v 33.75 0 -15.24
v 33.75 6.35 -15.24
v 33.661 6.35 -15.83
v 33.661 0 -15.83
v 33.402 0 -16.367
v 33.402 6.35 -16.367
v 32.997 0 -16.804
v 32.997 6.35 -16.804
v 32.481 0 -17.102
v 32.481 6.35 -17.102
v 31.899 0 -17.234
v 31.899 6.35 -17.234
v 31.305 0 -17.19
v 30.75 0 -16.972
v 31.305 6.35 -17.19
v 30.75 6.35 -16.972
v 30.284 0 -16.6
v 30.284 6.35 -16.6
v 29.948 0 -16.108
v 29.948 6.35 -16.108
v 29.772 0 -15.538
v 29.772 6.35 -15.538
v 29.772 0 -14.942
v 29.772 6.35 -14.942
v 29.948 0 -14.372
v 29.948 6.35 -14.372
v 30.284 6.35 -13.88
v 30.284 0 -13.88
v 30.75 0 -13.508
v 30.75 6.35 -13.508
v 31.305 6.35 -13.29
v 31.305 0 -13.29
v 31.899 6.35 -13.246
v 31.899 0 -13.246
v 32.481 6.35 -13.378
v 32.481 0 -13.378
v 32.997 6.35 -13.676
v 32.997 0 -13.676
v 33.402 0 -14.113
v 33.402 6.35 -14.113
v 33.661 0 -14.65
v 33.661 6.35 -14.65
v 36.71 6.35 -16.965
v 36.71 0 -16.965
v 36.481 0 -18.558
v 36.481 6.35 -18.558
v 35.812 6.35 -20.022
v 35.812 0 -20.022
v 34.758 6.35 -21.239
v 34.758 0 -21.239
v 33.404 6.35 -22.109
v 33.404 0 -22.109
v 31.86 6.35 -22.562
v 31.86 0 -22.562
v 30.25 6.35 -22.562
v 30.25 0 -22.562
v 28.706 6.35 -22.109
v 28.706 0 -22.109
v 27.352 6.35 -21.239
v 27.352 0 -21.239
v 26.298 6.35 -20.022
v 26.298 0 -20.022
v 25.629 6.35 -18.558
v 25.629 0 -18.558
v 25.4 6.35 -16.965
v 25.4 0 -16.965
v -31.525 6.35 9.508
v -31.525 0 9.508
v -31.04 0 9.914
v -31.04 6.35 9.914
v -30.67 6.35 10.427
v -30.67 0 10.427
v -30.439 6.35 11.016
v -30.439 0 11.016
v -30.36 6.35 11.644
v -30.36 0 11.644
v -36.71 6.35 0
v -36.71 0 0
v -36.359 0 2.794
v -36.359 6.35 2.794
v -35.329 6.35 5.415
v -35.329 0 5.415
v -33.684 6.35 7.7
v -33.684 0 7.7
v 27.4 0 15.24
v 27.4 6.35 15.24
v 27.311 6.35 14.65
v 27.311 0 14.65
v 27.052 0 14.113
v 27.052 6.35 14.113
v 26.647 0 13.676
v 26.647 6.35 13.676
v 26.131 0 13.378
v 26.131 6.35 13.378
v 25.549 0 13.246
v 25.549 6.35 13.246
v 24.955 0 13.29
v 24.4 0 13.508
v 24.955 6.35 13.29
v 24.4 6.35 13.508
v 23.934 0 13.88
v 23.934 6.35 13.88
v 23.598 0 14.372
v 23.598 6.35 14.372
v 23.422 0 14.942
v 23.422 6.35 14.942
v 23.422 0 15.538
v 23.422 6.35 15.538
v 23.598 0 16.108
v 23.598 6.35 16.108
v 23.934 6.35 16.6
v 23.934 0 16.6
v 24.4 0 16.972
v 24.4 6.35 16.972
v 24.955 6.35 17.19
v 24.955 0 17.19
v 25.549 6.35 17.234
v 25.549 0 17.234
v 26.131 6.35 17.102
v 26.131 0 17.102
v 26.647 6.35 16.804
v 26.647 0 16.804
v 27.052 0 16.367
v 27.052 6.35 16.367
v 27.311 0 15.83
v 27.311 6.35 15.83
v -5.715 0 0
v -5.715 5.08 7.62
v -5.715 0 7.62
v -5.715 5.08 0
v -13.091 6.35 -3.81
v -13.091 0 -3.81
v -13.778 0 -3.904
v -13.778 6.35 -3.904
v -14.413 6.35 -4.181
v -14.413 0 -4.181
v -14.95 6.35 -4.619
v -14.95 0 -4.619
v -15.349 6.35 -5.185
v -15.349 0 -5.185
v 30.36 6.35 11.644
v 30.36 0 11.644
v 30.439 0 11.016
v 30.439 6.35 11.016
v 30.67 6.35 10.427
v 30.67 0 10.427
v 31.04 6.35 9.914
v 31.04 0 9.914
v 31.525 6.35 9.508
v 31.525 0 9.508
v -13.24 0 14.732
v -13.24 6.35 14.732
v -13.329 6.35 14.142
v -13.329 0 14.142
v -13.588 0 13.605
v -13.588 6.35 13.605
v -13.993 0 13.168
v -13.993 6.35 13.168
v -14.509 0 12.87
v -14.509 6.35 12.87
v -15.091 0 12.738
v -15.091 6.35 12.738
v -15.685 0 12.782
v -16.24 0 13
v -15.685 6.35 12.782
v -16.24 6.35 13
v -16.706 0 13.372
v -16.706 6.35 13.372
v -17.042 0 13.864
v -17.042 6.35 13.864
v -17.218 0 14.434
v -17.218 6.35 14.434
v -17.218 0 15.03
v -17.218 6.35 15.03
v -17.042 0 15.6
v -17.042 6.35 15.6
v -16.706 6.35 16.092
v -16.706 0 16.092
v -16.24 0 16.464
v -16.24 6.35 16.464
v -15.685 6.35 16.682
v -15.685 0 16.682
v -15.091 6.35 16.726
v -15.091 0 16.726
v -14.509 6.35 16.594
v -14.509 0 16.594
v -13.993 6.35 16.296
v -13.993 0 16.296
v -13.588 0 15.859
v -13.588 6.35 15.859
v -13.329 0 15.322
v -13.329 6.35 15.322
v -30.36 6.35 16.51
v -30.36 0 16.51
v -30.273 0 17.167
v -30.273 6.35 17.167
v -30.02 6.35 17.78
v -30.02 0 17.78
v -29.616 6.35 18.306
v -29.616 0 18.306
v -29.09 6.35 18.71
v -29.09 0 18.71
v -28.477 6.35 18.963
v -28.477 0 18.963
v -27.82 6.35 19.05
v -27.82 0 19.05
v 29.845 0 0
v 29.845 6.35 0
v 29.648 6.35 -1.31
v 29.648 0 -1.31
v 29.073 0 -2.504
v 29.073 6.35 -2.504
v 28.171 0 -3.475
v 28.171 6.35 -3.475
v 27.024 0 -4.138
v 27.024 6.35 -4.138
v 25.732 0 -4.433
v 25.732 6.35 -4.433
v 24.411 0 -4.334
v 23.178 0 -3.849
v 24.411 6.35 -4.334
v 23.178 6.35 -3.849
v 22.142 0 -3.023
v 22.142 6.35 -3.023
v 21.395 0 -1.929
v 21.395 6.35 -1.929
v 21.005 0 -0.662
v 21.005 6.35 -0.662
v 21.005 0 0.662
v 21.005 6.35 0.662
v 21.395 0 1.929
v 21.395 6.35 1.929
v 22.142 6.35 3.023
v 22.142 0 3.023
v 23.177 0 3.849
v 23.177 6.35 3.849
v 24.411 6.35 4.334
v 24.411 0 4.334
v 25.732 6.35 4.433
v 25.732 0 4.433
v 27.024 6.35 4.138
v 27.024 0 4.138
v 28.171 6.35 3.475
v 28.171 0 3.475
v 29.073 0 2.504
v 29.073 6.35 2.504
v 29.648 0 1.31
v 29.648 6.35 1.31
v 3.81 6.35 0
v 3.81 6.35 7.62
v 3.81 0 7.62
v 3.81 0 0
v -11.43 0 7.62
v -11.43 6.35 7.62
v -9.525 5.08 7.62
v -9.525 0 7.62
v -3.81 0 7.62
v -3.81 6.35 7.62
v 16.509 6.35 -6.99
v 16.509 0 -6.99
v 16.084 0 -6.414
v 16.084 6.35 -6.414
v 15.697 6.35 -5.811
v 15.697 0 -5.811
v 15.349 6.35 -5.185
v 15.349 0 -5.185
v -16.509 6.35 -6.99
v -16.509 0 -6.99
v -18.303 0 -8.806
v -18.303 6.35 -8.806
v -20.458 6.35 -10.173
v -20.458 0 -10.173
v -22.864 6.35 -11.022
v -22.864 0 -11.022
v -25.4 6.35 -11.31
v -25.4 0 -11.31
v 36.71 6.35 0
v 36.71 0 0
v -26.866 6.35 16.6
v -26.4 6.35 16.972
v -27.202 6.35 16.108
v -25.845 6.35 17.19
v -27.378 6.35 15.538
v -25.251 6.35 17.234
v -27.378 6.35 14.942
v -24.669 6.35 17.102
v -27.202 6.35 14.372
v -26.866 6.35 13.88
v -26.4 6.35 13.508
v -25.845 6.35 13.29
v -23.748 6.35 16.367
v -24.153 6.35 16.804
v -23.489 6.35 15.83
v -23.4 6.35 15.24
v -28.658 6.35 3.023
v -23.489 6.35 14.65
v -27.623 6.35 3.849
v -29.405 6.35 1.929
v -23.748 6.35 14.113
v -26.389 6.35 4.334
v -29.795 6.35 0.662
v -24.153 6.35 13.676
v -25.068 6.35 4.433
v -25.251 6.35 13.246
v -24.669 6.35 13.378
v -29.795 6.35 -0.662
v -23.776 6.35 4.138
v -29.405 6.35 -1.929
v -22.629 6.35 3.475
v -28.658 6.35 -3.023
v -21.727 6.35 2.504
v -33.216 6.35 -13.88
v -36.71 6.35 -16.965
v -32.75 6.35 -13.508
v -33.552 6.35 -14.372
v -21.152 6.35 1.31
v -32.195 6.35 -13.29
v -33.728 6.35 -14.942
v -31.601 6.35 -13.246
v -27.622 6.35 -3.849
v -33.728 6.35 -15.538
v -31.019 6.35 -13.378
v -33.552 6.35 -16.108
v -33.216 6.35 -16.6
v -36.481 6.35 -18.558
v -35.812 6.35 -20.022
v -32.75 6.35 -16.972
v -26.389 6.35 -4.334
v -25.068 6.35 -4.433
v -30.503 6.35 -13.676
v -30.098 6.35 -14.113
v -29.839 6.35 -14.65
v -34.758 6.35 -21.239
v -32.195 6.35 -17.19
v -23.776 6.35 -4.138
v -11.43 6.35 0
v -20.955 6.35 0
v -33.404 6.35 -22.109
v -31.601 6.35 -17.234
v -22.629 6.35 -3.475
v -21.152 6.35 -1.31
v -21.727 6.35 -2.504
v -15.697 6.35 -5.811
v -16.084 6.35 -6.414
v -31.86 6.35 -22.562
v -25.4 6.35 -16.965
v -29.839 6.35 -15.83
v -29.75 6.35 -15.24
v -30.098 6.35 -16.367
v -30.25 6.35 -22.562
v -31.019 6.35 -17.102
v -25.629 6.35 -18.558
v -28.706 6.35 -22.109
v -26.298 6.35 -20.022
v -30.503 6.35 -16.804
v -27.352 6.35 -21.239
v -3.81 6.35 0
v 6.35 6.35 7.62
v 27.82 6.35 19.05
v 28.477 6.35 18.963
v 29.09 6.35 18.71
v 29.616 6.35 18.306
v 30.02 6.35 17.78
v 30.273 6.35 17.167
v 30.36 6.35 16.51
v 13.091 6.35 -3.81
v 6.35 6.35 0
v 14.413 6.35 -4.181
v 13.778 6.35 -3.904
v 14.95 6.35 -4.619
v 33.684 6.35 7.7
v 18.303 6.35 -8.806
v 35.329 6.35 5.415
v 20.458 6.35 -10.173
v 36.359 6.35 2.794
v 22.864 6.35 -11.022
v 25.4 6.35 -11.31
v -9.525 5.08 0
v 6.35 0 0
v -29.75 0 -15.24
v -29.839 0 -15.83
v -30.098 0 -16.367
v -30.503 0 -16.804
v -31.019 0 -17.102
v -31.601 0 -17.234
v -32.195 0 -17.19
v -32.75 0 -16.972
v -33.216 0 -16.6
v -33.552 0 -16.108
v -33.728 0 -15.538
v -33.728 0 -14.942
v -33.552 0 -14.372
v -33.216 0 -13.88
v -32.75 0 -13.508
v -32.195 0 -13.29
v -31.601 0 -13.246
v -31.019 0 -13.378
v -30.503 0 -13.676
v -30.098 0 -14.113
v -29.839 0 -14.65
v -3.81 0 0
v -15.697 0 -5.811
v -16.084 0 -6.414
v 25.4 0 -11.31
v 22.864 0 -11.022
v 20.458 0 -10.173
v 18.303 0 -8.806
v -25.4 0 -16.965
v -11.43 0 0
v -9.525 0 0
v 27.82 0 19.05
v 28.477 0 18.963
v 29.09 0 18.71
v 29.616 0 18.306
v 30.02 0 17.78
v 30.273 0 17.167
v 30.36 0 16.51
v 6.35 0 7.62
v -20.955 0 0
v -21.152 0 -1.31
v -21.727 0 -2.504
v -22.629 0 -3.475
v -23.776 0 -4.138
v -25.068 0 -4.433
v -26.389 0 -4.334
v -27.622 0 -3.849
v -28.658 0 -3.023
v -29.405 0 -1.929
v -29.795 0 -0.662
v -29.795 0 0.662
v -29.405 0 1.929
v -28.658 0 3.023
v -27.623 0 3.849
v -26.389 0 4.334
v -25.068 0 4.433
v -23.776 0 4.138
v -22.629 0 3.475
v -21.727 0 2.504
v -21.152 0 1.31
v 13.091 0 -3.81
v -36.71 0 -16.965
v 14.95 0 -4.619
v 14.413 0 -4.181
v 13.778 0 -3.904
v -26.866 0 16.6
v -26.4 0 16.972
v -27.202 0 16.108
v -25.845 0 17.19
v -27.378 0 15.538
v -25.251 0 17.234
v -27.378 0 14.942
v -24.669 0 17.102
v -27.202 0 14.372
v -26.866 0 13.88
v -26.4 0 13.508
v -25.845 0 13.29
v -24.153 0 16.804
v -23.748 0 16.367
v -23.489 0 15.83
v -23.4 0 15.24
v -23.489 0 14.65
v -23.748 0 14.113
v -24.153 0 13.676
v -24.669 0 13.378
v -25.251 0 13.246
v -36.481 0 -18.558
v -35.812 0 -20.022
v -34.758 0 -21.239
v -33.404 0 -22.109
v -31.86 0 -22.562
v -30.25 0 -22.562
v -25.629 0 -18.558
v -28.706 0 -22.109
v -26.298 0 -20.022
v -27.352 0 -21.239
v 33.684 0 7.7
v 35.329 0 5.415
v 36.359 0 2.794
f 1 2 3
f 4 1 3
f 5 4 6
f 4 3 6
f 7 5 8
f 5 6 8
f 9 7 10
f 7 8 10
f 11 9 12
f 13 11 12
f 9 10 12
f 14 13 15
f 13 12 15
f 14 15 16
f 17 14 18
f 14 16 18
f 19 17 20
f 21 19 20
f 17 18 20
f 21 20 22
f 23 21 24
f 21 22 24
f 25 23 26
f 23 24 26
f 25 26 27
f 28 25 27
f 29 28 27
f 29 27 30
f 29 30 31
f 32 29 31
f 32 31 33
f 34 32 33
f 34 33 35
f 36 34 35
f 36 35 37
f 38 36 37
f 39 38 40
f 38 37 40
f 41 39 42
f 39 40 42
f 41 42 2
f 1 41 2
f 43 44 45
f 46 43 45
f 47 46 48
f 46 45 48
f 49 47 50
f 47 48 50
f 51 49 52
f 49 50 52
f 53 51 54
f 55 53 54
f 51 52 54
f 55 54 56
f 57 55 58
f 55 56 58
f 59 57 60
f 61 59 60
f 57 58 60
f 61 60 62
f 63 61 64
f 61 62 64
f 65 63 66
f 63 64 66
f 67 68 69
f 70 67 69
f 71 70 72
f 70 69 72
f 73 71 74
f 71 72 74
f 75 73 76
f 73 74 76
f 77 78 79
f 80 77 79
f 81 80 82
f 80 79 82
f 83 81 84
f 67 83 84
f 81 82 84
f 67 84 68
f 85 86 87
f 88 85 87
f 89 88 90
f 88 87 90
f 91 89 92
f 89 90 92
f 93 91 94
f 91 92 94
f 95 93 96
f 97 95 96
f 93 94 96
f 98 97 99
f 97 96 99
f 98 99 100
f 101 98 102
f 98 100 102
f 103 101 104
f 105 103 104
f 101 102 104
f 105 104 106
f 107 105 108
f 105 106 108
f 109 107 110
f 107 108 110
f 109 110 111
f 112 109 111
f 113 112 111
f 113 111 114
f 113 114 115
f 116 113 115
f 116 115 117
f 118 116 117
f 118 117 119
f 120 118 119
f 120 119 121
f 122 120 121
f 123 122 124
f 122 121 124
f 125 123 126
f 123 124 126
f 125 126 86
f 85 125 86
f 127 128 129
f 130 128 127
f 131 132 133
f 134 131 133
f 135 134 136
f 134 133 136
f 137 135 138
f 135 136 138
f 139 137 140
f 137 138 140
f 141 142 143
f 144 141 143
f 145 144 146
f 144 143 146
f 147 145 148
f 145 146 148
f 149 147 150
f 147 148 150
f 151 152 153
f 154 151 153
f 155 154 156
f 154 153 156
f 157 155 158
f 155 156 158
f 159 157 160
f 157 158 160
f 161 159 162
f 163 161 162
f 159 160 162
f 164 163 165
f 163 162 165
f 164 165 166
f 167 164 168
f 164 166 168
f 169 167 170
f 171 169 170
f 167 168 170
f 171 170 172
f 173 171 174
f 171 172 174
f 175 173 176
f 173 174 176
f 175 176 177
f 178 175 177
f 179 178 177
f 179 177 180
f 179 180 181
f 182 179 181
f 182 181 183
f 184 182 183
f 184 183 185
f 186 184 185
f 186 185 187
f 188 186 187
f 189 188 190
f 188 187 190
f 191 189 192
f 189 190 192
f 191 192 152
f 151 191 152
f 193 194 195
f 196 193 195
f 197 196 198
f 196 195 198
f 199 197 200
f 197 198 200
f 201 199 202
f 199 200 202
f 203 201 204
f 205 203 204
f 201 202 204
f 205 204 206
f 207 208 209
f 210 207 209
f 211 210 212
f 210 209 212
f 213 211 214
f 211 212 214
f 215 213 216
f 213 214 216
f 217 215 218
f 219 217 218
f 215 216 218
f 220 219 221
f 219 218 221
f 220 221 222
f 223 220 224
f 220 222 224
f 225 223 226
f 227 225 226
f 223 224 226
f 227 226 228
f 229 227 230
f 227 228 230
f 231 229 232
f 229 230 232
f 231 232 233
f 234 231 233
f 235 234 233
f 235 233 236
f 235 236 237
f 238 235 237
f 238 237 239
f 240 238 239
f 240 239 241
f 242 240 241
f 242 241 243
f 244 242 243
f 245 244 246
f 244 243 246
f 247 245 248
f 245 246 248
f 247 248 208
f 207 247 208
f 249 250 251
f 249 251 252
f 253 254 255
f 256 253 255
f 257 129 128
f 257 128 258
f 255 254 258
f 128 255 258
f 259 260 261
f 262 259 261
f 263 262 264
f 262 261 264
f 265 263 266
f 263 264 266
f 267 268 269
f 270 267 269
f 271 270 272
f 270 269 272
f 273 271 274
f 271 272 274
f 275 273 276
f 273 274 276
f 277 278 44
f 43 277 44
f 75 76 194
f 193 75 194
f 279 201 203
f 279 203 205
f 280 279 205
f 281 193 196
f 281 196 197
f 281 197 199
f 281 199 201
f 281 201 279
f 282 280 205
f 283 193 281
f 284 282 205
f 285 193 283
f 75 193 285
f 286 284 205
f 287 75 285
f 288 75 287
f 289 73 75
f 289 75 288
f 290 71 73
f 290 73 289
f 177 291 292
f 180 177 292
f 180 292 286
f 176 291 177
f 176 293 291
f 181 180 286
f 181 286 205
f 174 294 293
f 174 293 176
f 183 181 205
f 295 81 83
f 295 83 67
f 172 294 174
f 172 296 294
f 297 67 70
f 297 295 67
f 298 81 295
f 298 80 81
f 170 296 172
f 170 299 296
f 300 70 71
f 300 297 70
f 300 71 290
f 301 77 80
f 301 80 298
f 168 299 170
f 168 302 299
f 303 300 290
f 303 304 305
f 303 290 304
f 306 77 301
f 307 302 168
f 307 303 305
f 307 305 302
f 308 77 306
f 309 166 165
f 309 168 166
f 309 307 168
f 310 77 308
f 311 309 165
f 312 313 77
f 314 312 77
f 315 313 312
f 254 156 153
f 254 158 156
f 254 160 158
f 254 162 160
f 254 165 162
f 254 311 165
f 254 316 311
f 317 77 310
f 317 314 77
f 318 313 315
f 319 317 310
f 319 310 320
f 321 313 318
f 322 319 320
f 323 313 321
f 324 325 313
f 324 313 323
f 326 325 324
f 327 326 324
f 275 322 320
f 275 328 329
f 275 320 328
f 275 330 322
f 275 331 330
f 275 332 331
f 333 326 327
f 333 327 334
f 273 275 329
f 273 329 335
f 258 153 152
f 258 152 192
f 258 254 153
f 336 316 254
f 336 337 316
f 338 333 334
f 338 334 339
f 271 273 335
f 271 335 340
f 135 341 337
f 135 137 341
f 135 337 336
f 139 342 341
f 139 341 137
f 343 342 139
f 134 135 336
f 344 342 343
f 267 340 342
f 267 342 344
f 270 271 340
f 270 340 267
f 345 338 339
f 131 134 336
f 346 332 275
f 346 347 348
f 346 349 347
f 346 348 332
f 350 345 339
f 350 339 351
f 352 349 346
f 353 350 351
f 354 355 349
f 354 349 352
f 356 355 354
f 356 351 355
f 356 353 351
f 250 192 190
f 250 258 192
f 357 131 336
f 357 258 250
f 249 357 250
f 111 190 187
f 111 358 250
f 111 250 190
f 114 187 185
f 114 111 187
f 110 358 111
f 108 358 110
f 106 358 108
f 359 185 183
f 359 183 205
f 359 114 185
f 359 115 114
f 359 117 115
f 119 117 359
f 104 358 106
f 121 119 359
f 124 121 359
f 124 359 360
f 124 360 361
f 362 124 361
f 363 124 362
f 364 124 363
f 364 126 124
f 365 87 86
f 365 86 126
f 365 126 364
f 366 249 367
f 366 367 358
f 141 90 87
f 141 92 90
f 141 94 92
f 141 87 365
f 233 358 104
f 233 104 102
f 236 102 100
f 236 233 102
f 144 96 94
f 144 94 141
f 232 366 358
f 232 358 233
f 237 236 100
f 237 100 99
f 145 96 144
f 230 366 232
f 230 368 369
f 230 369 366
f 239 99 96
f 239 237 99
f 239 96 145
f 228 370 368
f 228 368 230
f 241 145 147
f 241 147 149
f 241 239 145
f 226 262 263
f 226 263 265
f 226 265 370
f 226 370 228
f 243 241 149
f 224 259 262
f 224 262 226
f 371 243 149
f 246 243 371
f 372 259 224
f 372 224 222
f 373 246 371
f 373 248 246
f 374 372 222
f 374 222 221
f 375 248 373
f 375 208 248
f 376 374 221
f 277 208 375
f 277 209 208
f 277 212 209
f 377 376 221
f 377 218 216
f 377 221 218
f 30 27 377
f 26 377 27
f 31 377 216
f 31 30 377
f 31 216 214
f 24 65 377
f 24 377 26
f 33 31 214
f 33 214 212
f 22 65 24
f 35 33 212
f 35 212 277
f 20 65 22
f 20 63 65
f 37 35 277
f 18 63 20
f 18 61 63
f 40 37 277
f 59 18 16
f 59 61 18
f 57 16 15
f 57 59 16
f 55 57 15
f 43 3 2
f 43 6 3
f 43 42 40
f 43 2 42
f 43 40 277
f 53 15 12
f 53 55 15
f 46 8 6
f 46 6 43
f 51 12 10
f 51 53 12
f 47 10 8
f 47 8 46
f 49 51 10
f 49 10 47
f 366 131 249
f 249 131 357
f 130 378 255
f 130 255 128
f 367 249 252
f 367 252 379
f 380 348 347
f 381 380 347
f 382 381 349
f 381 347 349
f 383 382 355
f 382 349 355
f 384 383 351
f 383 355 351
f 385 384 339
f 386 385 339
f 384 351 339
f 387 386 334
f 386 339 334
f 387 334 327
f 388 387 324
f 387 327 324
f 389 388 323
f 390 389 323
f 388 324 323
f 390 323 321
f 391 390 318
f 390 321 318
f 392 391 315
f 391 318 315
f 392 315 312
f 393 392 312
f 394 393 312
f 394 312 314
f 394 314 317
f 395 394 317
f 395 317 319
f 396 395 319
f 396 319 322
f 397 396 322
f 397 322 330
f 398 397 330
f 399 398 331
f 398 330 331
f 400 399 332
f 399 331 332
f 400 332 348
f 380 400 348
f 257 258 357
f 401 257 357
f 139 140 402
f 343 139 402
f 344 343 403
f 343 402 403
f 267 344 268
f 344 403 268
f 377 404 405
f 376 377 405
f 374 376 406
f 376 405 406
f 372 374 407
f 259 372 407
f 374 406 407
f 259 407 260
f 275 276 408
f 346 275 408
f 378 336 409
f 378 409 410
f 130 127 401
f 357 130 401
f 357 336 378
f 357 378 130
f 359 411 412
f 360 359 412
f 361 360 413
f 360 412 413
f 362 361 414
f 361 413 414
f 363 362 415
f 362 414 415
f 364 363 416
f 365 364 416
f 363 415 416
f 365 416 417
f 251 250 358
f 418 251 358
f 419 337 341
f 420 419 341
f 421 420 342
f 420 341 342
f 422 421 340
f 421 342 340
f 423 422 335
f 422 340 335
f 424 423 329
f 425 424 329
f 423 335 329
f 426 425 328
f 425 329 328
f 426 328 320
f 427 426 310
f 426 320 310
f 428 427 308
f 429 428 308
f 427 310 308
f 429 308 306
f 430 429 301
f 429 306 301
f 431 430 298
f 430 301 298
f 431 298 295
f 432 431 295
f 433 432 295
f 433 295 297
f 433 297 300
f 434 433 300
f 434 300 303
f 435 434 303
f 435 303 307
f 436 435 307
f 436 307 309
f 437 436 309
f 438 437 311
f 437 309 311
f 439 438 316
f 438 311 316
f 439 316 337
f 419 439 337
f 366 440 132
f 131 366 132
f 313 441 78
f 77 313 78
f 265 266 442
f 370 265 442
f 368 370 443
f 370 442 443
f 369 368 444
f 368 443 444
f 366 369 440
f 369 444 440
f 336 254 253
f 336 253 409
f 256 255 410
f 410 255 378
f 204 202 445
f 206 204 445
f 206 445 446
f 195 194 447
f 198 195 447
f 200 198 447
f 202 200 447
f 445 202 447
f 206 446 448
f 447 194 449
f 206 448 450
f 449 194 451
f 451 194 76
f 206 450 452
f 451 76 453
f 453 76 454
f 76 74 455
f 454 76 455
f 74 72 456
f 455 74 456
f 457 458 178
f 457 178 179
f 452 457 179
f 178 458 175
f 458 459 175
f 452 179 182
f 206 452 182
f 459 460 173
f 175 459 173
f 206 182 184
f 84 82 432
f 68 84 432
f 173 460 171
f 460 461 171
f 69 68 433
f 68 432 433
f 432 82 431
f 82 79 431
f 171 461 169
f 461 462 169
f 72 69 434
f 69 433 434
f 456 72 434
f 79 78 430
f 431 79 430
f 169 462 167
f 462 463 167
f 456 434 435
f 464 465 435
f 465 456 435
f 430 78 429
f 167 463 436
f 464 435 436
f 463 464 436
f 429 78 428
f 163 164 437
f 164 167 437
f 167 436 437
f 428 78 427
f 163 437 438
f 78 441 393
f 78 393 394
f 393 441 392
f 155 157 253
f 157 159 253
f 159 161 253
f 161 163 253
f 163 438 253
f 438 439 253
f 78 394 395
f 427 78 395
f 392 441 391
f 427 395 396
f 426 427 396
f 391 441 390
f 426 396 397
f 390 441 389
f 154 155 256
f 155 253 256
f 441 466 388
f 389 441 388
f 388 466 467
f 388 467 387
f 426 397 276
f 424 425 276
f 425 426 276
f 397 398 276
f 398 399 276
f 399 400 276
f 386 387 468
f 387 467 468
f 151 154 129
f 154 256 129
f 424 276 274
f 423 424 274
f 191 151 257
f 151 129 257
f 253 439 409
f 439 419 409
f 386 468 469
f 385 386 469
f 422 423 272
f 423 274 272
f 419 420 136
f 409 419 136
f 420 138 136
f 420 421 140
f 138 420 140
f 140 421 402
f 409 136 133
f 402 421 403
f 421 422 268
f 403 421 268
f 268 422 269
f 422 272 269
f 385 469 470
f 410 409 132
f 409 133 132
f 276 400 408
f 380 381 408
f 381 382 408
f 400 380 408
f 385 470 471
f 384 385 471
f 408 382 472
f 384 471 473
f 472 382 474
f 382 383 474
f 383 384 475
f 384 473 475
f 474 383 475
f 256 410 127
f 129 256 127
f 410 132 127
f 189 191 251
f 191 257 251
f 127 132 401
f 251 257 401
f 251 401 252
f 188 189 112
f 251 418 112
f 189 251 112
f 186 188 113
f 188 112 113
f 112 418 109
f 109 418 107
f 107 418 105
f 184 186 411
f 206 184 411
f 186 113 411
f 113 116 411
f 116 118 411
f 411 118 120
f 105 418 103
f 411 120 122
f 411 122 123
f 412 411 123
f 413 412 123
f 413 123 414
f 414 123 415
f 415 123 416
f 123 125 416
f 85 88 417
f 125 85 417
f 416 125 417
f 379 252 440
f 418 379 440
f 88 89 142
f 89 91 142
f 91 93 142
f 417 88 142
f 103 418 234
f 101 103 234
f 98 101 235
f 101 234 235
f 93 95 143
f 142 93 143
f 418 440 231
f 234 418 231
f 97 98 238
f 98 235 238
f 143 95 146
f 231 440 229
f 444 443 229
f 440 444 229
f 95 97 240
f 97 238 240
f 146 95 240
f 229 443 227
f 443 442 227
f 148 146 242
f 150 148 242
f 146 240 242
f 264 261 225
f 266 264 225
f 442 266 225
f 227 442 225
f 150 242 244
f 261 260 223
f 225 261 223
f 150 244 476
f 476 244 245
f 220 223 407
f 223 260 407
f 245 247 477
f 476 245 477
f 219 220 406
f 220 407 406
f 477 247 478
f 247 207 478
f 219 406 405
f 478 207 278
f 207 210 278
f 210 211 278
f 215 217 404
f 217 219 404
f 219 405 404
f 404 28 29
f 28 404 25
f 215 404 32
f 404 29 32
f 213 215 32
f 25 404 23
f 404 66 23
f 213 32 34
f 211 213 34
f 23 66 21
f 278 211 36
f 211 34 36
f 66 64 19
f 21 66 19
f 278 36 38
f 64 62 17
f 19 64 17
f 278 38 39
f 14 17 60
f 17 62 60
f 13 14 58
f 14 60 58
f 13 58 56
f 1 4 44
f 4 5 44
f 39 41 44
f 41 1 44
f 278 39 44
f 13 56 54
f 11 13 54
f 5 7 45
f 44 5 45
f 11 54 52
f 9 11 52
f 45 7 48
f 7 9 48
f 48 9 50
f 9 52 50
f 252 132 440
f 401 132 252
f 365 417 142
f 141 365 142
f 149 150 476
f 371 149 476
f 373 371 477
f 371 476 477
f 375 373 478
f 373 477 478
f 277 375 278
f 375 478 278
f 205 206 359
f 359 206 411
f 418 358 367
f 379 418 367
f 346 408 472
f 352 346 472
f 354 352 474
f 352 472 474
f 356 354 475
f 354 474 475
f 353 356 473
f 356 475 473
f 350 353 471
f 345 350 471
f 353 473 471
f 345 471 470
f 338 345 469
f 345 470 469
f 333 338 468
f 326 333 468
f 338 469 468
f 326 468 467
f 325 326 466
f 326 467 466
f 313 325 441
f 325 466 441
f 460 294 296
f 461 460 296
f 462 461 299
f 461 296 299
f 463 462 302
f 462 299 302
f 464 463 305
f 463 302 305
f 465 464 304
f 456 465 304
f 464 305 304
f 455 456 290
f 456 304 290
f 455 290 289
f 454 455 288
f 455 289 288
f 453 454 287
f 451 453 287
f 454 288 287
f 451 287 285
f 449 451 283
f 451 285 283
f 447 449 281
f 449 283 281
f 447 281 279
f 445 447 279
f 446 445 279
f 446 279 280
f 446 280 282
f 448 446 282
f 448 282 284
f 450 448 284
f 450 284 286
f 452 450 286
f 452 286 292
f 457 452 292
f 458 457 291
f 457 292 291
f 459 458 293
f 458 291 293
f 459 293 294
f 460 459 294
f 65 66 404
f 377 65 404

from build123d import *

# Parameters (mm, degrees)
BOSS_EXTRUDE1_DEPTH = 6.35
SKETCH3_R           = 4.445
CUT_EXTRUDE2_DEPTH  = 6.35
SKETCH11_W          = 2.54
SKETCH11_H          = 7.62
SKETCH11_W_2        = 1.905
CUT_EXTRUDE6_DEPTH  = 6.35
SKETCH14_W          = 3.81
SKETCH14_H          = 7.62
CUT_EXTRUDE8_DEPTH  = 1.27
SKETCH8_R           = 2
CUT_EXTRUDE10_DEPTH = 6.35
SKETCH15_R          = 2
CUT_EXTRUDE11_DEPTH = 6.35


with BuildPart() as part:
    # Sketch1 → Boss-Extrude1 (new body)
    with BuildSketch(Plane(origin=(0, 0, 0), x_dir=(1, 0, 0), z_dir=(0, 1, 0))):
        with BuildLine():
            Line((-25.4, 11.309999986), (-25.4, 16.964999979))
            ThreePointArc((-25.4, 16.964999979), (-31.054999993, 22.619999972), (-36.709999986, 16.964999979))
            Line((-36.709999986, 16.964999979), (-36.709999986, 11.309999986))
            Line((-36.709999986, 11.309999986), (-36.709999986, 0))
            ThreePointArc((-36.709999986, 0), (-35.329369206, -5.415138673), (-31.524548724, -9.508207119))
            ThreePointArc((-31.524548724, -9.508207119), (-30.670062071, -10.427428504), (-30.359999986, -11.643560444))
            Line((-30.359999986, -11.643560444), (-30.359999986, -16.51))
            ThreePointArc((-30.359999986, -16.51), (-29.61605121, -18.306051224), (-27.819999986, -19.05))
            Line((-27.819999986, -19.05), (27.819999986, -19.05))
            ThreePointArc((27.819999986, -19.05), (29.61605121, -18.306051224), (30.359999986, -16.51))
            Line((30.359999986, -16.51), (30.359999986, -11.643560444))
            ThreePointArc((30.359999986, -11.643560444), (30.670062071, -10.427428504), (31.524548724, -9.508207119))
            ThreePointArc((31.524548724, -9.508207119), (35.329369206, -5.415138673), (36.709999986, 0))
            Line((36.709999986, 0), (36.709999986, 11.309999986))
            Line((36.709999986, 11.309999986), (36.709999986, 16.964999979))
            ThreePointArc((36.709999986, 16.964999979), (31.054999993, 22.619999972), (25.4, 16.964999979))
            Line((25.4, 16.964999979), (25.4, 11.309999986))
            ThreePointArc((25.4, 11.309999986), (20.457539197, 10.172914081), (16.508889627, 6.990297277))
            ThreePointArc((16.508889627, 6.990297277), (15.885935778, 6.115446153), (15.348771474, 5.185451262))
            ThreePointArc((15.348771474, 5.185451262), (14.413140747, 4.180950232), (13.091466391, 3.81))
            Line((13.091466391, 3.81), (-13.091466391, 3.81))
            ThreePointArc((-13.091466391, 3.81), (-14.413140747, 4.180950232), (-15.348771474, 5.185451262))
            ThreePointArc((-15.348771474, 5.185451262), (-15.885935775, 6.115446149), (-16.508889621, 6.990297269))
            ThreePointArc((-16.508889621, 6.990297269), (-20.457539193, 10.172914079), (-25.4, 11.309999986))
        make_face()
    extrude(amount=BOSS_EXTRUDE1_DEPTH)

    # Sketch3 → Cut-Extrude2 (cut)
    with BuildSketch(Plane(origin=(0, 6.35, 0), x_dir=(1, 0, 0), z_dir=(0, 1, 0))):
        with Locations((-25.4, 0)):
            Circle(SKETCH3_R)
        with Locations((25.4, 0)):
            Circle(SKETCH3_R)
    extrude(amount=-CUT_EXTRUDE2_DEPTH, mode=Mode.SUBTRACT)

    # Sketch11 → Cut-Extrude6 (cut)
    with BuildSketch(Plane(origin=(0, 6.35, 0), x_dir=(1, 0, 0), z_dir=(0, 1, 0))):
        with Locations((5.08, -3.81)):
            Rectangle(SKETCH11_W, SKETCH11_H)
        with Locations((-4.7625, -3.81)):
            Rectangle(SKETCH11_W_2, SKETCH11_H)
        with Locations((-10.4775, -3.81)):
            Rectangle(SKETCH11_W_2, SKETCH11_H)
    extrude(amount=-CUT_EXTRUDE6_DEPTH, mode=Mode.SUBTRACT)

    # Sketch14 → Cut-Extrude8 (cut)
    with BuildSketch(Plane(origin=(0, 6.35, 0), x_dir=(1, 0, 0), z_dir=(0, 1, 0))):
        with Locations((-7.62, -3.81)):
            Rectangle(SKETCH14_W, SKETCH14_H)
    extrude(amount=-CUT_EXTRUDE8_DEPTH, mode=Mode.SUBTRACT)

    # Sketch8 → Cut-Extrude10 (cut)
    with BuildSketch(Plane(origin=(0, 6.35, 0), x_dir=(1, 0, 0), z_dir=(0, 1, 0))):
        with Locations((-31.75, 15.24)):
            Circle(SKETCH8_R)
        with Locations((25.4, -15.24)):
            Circle(SKETCH8_R)
        with Locations((-25.4, -15.24)):
            Circle(SKETCH8_R)
        with Locations((31.75, 15.24)):
            Circle(SKETCH8_R)
    extrude(amount=-CUT_EXTRUDE10_DEPTH, mode=Mode.SUBTRACT)

    # Sketch15 → Cut-Extrude11 (cut)
    with BuildSketch(Plane(origin=(0, 6.35, 0), x_dir=(1, 0, 0), z_dir=(0, 1, 0))):
        with Locations((-15.24, -14.732)):
            Circle(SKETCH15_R)
    extrude(amount=-CUT_EXTRUDE11_DEPTH, mode=Mode.SUBTRACT)


solid = part.part
